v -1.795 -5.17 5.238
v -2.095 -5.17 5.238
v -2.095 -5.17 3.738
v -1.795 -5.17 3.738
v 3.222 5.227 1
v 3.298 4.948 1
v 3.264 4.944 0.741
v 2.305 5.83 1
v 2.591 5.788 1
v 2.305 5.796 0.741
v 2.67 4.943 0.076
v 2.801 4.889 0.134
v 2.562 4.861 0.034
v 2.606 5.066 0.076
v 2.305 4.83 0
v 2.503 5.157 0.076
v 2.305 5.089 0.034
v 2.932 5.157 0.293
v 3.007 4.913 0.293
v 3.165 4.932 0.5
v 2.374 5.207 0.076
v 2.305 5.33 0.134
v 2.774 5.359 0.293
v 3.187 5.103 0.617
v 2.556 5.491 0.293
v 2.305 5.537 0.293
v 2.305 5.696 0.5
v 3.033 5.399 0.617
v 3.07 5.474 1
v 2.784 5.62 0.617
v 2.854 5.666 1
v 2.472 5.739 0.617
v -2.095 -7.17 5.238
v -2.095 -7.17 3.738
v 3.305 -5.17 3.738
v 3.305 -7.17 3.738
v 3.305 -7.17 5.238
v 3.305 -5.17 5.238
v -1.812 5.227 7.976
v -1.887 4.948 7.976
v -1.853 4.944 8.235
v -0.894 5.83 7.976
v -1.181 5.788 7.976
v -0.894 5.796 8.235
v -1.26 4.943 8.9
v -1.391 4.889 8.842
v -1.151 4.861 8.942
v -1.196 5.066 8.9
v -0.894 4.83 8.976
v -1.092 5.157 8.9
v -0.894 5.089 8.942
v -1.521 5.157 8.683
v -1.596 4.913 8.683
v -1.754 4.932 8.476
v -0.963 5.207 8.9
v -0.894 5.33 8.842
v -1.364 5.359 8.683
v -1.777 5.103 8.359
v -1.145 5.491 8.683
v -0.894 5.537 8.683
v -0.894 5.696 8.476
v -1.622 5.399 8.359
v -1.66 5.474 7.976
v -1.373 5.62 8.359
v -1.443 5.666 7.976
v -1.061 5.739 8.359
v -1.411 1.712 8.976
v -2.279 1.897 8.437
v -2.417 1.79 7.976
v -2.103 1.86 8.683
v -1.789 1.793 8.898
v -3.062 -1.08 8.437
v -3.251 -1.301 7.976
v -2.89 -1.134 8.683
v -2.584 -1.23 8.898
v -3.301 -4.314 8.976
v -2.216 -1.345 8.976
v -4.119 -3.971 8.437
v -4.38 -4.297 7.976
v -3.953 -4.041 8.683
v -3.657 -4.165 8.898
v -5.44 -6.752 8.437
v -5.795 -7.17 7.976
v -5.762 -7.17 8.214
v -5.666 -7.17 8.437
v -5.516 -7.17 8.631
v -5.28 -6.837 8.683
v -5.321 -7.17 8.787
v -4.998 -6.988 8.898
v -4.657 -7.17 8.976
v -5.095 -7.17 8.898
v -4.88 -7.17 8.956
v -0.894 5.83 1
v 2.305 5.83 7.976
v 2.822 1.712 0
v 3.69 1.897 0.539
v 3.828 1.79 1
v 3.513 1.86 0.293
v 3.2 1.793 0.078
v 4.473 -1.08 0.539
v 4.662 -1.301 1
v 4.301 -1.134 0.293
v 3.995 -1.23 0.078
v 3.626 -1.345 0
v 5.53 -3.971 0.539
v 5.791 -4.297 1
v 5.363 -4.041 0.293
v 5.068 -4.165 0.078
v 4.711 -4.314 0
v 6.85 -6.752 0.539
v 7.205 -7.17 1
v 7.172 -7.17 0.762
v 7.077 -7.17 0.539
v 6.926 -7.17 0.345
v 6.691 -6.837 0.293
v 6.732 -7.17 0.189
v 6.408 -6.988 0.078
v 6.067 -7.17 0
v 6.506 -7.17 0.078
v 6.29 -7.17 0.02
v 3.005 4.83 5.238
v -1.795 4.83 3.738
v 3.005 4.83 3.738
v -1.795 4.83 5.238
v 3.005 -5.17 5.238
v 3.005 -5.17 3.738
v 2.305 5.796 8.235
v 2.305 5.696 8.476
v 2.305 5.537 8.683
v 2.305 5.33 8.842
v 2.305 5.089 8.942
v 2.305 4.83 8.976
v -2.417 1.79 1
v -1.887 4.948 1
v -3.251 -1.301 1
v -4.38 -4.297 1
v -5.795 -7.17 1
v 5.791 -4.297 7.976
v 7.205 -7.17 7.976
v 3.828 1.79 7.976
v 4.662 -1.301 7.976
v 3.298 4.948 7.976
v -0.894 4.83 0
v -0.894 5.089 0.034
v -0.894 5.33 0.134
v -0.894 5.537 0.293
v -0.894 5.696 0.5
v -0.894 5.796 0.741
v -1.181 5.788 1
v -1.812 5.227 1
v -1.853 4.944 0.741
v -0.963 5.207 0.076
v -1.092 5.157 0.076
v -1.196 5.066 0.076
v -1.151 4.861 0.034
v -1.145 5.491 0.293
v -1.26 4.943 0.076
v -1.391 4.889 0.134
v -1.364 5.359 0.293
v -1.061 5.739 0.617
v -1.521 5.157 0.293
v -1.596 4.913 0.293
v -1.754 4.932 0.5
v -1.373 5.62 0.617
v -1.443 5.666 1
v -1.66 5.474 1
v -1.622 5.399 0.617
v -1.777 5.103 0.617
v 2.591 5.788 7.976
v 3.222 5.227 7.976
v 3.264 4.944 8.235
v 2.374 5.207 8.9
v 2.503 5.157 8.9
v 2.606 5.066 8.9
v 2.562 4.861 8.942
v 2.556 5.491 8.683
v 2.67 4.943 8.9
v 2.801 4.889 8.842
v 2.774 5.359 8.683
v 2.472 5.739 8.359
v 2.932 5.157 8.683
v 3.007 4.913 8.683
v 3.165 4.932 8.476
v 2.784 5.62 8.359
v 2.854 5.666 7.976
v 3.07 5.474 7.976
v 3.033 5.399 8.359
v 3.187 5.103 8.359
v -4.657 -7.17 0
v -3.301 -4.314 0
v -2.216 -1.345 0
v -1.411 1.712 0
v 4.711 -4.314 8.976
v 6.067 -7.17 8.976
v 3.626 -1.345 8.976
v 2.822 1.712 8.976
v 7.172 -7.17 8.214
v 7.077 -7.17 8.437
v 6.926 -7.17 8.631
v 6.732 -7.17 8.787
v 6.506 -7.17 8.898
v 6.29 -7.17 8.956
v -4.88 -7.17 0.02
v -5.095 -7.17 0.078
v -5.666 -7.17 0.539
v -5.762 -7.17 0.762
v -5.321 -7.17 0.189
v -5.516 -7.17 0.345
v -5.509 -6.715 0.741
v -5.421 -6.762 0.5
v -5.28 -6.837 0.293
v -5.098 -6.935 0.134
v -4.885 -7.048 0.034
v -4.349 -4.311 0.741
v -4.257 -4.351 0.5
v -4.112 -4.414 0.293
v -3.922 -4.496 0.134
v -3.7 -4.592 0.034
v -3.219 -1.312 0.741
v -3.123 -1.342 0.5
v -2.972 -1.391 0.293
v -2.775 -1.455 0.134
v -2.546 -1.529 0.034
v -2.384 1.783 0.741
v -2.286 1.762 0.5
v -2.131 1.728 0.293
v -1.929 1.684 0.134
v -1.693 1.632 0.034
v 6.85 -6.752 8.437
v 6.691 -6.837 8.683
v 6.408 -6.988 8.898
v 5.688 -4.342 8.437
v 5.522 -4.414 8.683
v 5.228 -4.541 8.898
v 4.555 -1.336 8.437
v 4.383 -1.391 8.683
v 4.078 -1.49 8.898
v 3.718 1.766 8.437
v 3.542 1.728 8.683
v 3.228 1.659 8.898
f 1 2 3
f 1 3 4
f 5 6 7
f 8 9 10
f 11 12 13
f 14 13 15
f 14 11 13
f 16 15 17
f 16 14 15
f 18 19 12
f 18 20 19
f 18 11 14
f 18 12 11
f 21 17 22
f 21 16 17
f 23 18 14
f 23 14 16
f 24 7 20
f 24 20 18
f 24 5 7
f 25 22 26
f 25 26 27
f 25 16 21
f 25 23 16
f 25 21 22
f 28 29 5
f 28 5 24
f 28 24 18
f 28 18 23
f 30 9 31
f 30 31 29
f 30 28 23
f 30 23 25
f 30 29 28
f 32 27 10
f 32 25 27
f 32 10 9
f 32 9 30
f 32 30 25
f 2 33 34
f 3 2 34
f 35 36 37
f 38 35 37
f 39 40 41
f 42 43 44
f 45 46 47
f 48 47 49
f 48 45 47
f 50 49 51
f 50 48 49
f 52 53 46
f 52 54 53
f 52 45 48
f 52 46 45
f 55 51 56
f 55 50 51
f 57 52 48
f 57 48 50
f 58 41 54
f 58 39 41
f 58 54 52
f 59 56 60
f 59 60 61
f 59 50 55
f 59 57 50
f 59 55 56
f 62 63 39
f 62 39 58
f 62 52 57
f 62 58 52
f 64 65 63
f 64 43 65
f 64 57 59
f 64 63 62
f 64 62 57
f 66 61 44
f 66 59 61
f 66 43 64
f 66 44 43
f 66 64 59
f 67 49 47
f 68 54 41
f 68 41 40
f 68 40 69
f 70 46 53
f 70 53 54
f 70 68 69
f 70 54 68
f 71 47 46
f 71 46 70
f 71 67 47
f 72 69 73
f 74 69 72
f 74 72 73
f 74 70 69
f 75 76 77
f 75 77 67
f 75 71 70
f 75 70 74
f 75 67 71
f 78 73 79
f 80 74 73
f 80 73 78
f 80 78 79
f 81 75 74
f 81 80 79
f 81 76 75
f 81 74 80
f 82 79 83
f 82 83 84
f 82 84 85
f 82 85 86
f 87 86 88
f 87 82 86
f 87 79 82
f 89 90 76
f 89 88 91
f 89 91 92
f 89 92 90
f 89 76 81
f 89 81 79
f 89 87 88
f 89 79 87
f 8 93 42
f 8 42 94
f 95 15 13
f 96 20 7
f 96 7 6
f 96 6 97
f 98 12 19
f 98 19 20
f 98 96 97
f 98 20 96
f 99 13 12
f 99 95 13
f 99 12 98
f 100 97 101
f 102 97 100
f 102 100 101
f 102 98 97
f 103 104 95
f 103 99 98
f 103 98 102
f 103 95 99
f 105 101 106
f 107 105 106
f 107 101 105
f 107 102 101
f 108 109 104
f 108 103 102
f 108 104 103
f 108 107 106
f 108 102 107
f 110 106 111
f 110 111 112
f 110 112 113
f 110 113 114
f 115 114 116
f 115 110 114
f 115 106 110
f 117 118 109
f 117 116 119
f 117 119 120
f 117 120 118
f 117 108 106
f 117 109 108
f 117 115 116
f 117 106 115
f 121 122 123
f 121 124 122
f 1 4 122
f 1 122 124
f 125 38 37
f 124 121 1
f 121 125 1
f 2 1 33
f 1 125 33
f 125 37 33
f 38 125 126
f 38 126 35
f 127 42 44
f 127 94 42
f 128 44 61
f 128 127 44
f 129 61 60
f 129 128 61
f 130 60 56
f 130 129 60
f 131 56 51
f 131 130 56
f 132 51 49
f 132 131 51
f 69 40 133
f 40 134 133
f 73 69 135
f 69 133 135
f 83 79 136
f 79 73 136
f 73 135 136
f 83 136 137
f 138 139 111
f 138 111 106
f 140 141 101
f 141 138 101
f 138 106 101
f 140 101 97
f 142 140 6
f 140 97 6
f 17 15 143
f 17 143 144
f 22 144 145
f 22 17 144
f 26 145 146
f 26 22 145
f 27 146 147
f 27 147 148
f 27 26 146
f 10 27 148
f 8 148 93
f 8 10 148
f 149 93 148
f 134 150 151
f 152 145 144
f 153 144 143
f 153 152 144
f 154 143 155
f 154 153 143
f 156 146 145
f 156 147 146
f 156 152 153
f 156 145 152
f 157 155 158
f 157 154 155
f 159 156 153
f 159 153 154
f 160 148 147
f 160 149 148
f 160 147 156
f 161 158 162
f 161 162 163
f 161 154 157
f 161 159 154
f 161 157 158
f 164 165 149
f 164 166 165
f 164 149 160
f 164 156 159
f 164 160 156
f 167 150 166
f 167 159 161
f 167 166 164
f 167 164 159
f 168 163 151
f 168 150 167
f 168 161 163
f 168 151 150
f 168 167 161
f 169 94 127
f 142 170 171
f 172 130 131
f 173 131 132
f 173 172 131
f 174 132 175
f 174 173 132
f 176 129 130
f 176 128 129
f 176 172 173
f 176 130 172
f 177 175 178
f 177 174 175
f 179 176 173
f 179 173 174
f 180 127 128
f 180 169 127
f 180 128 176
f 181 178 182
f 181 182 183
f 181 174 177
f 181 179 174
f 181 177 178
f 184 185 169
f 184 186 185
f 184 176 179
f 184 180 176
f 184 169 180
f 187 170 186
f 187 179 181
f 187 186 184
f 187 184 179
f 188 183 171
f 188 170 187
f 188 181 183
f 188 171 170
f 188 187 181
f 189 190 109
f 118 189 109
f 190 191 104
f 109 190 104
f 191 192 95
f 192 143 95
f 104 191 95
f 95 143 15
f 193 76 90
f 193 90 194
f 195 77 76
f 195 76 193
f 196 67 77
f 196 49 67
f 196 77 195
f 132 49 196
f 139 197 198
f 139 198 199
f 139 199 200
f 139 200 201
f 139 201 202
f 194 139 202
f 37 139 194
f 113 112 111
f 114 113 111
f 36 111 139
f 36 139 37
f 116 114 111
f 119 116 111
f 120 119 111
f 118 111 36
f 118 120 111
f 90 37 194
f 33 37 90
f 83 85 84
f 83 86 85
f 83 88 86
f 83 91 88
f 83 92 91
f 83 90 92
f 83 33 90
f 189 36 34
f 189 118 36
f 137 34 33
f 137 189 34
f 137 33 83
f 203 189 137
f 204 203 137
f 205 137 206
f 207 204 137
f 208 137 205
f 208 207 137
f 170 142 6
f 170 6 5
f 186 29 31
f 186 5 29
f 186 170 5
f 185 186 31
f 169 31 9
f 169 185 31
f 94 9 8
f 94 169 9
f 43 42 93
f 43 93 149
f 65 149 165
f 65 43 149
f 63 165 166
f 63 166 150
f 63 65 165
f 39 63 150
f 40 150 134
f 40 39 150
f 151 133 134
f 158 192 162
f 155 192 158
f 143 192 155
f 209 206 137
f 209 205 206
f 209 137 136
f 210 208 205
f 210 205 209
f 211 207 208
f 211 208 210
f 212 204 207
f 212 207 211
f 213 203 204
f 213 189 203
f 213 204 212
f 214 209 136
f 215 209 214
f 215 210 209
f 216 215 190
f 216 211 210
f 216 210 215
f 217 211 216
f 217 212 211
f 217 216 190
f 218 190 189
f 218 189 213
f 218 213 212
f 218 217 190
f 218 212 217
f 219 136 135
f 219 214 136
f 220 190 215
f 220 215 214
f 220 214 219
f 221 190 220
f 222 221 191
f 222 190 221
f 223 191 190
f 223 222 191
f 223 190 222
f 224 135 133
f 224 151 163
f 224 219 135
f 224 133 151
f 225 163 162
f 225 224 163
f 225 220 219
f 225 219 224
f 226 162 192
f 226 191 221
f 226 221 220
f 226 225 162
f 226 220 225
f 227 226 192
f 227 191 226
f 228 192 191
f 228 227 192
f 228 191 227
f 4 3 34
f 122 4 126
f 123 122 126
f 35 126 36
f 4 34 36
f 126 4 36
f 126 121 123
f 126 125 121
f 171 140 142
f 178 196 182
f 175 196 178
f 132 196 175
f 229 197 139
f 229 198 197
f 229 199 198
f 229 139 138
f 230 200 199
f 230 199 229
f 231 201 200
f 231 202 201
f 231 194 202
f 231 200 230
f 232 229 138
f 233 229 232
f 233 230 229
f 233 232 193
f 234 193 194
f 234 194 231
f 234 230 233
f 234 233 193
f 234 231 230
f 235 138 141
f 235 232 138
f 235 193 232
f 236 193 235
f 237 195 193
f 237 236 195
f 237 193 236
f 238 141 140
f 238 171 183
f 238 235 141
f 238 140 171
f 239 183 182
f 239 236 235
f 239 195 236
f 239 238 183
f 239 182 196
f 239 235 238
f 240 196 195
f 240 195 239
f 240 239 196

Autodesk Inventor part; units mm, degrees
ref_plane "YZ Plane" through (0, 0, 0) normal (1, 0, 0) x (0, 1, 0)
ref_plane "XZ Plane" through (0, 0, 0) normal (0, 1, 0) x (-1, 0, 0)
ref_plane "XY Plane" through (0, 0, 0) normal (0, 0, 1) x (1, 0, 0)
sketch "Sketch1" plane through (0, 0, 0) normal (0, 0, 1) x (1, 0, 0)
  line L0 (-5.7947, 5.8302) -> (7.2053, 5.8302)
  line L1 (7.2053, 5.8302) -> (7.2053, -7.1698)
  line L2 (7.2053, -7.1698) -> (-5.7947, -7.1698)
  line L3 (-5.7947, -7.1698) -> (-5.7947, 5.8302)
  arc A0 (-5.7947, -7.1698) -> (-1.7947, 5.8302) centre (-34.6583, 8.8267) ccw
  arc A1 (3.2053, 5.8302) -> (7.2053, -7.1698) centre (36.069, 8.8267) ccw
  point P0 (0, 0)
  dimension "d0" = 13
  dimension "d1" = 13
  dimension "d2" = 4
  dimension "d3" = 4
  dimension "d4" = 33
  dimension "d5" = 33
extrude "Extrusion1" add sketch "Sketch1" along normal blind 8.976 contours L0 A1 L2 A0
sketch "Sketch2" plane through (-5.7947, -7.1698, 0) normal (0, -1, 0) x (1, 0, 0)
  line L0 (9.1, 5.238) -> (3.7, 5.238)
  line L1 (3.7, 5.238) -> (3.7, 3.738)
  line L2 (3.7, 3.738) -> (9.1, 3.738)
  line L3 (9.1, 3.738) -> (9.1, 5.238)
  line L4 (0, 8.976) -> (13, 8.976) projected
  line L5 (13, 0) -> (13, 8.976) projected
  point P0 (5.7947, 0)
  dimension "d8" = 1.5
  dimension "d9" = 5.4
  dimension "d10" = 3.738
  dimension "d11" = 3.9
extrude "Extrusion2" cut sketch "Sketch2" against normal blind 2
sketch "Sketch3" plane through (-5.7947, -5.1698, 0) normal (0, -1, 0) x (1, 0, 0)
  line L0 (9.1, 3.738) -> (3.7, 3.738) projected
  line L1 (4, 5.238) -> (8.8, 5.238)
  line L2 (8.8, 5.238) -> (8.8, 3.738)
  line L3 (8.8, 3.738) -> (4, 3.738)
  line L4 (4, 3.738) -> (4, 5.238)
  line L5 (3.7, 5.238) -> (9.1, 5.238) projected
  line L6 (3.7, 3.738) -> (3.7, 5.238) projected
  line L7 (9.1, 5.238) -> (9.1, 3.738) projected
  point P0 (5.7947, 0)
  dimension "d14" = 0
  dimension "d15" = 0.3
  dimension "d16" = 0.3
extrude "Extrusion3" cut sketch "Sketch3" against normal blind 10 contours L0 L4 L1 L2
fillet "Fillet1" radius 1 8 edges at (3.2053, 5.8302, 4.488) (-3.1176, -0.8781, 8.976) (0.7053, 5.8302, 8.976) (-1.7947, 5.8302, 4.488) (0.7053, 5.8302, 0) (4.5283, -0.8781, 0) (-3.1176, -0.8781, 0) (4.5283, -0.8781, 8.976)
properties part number "SingleSliderCap"
